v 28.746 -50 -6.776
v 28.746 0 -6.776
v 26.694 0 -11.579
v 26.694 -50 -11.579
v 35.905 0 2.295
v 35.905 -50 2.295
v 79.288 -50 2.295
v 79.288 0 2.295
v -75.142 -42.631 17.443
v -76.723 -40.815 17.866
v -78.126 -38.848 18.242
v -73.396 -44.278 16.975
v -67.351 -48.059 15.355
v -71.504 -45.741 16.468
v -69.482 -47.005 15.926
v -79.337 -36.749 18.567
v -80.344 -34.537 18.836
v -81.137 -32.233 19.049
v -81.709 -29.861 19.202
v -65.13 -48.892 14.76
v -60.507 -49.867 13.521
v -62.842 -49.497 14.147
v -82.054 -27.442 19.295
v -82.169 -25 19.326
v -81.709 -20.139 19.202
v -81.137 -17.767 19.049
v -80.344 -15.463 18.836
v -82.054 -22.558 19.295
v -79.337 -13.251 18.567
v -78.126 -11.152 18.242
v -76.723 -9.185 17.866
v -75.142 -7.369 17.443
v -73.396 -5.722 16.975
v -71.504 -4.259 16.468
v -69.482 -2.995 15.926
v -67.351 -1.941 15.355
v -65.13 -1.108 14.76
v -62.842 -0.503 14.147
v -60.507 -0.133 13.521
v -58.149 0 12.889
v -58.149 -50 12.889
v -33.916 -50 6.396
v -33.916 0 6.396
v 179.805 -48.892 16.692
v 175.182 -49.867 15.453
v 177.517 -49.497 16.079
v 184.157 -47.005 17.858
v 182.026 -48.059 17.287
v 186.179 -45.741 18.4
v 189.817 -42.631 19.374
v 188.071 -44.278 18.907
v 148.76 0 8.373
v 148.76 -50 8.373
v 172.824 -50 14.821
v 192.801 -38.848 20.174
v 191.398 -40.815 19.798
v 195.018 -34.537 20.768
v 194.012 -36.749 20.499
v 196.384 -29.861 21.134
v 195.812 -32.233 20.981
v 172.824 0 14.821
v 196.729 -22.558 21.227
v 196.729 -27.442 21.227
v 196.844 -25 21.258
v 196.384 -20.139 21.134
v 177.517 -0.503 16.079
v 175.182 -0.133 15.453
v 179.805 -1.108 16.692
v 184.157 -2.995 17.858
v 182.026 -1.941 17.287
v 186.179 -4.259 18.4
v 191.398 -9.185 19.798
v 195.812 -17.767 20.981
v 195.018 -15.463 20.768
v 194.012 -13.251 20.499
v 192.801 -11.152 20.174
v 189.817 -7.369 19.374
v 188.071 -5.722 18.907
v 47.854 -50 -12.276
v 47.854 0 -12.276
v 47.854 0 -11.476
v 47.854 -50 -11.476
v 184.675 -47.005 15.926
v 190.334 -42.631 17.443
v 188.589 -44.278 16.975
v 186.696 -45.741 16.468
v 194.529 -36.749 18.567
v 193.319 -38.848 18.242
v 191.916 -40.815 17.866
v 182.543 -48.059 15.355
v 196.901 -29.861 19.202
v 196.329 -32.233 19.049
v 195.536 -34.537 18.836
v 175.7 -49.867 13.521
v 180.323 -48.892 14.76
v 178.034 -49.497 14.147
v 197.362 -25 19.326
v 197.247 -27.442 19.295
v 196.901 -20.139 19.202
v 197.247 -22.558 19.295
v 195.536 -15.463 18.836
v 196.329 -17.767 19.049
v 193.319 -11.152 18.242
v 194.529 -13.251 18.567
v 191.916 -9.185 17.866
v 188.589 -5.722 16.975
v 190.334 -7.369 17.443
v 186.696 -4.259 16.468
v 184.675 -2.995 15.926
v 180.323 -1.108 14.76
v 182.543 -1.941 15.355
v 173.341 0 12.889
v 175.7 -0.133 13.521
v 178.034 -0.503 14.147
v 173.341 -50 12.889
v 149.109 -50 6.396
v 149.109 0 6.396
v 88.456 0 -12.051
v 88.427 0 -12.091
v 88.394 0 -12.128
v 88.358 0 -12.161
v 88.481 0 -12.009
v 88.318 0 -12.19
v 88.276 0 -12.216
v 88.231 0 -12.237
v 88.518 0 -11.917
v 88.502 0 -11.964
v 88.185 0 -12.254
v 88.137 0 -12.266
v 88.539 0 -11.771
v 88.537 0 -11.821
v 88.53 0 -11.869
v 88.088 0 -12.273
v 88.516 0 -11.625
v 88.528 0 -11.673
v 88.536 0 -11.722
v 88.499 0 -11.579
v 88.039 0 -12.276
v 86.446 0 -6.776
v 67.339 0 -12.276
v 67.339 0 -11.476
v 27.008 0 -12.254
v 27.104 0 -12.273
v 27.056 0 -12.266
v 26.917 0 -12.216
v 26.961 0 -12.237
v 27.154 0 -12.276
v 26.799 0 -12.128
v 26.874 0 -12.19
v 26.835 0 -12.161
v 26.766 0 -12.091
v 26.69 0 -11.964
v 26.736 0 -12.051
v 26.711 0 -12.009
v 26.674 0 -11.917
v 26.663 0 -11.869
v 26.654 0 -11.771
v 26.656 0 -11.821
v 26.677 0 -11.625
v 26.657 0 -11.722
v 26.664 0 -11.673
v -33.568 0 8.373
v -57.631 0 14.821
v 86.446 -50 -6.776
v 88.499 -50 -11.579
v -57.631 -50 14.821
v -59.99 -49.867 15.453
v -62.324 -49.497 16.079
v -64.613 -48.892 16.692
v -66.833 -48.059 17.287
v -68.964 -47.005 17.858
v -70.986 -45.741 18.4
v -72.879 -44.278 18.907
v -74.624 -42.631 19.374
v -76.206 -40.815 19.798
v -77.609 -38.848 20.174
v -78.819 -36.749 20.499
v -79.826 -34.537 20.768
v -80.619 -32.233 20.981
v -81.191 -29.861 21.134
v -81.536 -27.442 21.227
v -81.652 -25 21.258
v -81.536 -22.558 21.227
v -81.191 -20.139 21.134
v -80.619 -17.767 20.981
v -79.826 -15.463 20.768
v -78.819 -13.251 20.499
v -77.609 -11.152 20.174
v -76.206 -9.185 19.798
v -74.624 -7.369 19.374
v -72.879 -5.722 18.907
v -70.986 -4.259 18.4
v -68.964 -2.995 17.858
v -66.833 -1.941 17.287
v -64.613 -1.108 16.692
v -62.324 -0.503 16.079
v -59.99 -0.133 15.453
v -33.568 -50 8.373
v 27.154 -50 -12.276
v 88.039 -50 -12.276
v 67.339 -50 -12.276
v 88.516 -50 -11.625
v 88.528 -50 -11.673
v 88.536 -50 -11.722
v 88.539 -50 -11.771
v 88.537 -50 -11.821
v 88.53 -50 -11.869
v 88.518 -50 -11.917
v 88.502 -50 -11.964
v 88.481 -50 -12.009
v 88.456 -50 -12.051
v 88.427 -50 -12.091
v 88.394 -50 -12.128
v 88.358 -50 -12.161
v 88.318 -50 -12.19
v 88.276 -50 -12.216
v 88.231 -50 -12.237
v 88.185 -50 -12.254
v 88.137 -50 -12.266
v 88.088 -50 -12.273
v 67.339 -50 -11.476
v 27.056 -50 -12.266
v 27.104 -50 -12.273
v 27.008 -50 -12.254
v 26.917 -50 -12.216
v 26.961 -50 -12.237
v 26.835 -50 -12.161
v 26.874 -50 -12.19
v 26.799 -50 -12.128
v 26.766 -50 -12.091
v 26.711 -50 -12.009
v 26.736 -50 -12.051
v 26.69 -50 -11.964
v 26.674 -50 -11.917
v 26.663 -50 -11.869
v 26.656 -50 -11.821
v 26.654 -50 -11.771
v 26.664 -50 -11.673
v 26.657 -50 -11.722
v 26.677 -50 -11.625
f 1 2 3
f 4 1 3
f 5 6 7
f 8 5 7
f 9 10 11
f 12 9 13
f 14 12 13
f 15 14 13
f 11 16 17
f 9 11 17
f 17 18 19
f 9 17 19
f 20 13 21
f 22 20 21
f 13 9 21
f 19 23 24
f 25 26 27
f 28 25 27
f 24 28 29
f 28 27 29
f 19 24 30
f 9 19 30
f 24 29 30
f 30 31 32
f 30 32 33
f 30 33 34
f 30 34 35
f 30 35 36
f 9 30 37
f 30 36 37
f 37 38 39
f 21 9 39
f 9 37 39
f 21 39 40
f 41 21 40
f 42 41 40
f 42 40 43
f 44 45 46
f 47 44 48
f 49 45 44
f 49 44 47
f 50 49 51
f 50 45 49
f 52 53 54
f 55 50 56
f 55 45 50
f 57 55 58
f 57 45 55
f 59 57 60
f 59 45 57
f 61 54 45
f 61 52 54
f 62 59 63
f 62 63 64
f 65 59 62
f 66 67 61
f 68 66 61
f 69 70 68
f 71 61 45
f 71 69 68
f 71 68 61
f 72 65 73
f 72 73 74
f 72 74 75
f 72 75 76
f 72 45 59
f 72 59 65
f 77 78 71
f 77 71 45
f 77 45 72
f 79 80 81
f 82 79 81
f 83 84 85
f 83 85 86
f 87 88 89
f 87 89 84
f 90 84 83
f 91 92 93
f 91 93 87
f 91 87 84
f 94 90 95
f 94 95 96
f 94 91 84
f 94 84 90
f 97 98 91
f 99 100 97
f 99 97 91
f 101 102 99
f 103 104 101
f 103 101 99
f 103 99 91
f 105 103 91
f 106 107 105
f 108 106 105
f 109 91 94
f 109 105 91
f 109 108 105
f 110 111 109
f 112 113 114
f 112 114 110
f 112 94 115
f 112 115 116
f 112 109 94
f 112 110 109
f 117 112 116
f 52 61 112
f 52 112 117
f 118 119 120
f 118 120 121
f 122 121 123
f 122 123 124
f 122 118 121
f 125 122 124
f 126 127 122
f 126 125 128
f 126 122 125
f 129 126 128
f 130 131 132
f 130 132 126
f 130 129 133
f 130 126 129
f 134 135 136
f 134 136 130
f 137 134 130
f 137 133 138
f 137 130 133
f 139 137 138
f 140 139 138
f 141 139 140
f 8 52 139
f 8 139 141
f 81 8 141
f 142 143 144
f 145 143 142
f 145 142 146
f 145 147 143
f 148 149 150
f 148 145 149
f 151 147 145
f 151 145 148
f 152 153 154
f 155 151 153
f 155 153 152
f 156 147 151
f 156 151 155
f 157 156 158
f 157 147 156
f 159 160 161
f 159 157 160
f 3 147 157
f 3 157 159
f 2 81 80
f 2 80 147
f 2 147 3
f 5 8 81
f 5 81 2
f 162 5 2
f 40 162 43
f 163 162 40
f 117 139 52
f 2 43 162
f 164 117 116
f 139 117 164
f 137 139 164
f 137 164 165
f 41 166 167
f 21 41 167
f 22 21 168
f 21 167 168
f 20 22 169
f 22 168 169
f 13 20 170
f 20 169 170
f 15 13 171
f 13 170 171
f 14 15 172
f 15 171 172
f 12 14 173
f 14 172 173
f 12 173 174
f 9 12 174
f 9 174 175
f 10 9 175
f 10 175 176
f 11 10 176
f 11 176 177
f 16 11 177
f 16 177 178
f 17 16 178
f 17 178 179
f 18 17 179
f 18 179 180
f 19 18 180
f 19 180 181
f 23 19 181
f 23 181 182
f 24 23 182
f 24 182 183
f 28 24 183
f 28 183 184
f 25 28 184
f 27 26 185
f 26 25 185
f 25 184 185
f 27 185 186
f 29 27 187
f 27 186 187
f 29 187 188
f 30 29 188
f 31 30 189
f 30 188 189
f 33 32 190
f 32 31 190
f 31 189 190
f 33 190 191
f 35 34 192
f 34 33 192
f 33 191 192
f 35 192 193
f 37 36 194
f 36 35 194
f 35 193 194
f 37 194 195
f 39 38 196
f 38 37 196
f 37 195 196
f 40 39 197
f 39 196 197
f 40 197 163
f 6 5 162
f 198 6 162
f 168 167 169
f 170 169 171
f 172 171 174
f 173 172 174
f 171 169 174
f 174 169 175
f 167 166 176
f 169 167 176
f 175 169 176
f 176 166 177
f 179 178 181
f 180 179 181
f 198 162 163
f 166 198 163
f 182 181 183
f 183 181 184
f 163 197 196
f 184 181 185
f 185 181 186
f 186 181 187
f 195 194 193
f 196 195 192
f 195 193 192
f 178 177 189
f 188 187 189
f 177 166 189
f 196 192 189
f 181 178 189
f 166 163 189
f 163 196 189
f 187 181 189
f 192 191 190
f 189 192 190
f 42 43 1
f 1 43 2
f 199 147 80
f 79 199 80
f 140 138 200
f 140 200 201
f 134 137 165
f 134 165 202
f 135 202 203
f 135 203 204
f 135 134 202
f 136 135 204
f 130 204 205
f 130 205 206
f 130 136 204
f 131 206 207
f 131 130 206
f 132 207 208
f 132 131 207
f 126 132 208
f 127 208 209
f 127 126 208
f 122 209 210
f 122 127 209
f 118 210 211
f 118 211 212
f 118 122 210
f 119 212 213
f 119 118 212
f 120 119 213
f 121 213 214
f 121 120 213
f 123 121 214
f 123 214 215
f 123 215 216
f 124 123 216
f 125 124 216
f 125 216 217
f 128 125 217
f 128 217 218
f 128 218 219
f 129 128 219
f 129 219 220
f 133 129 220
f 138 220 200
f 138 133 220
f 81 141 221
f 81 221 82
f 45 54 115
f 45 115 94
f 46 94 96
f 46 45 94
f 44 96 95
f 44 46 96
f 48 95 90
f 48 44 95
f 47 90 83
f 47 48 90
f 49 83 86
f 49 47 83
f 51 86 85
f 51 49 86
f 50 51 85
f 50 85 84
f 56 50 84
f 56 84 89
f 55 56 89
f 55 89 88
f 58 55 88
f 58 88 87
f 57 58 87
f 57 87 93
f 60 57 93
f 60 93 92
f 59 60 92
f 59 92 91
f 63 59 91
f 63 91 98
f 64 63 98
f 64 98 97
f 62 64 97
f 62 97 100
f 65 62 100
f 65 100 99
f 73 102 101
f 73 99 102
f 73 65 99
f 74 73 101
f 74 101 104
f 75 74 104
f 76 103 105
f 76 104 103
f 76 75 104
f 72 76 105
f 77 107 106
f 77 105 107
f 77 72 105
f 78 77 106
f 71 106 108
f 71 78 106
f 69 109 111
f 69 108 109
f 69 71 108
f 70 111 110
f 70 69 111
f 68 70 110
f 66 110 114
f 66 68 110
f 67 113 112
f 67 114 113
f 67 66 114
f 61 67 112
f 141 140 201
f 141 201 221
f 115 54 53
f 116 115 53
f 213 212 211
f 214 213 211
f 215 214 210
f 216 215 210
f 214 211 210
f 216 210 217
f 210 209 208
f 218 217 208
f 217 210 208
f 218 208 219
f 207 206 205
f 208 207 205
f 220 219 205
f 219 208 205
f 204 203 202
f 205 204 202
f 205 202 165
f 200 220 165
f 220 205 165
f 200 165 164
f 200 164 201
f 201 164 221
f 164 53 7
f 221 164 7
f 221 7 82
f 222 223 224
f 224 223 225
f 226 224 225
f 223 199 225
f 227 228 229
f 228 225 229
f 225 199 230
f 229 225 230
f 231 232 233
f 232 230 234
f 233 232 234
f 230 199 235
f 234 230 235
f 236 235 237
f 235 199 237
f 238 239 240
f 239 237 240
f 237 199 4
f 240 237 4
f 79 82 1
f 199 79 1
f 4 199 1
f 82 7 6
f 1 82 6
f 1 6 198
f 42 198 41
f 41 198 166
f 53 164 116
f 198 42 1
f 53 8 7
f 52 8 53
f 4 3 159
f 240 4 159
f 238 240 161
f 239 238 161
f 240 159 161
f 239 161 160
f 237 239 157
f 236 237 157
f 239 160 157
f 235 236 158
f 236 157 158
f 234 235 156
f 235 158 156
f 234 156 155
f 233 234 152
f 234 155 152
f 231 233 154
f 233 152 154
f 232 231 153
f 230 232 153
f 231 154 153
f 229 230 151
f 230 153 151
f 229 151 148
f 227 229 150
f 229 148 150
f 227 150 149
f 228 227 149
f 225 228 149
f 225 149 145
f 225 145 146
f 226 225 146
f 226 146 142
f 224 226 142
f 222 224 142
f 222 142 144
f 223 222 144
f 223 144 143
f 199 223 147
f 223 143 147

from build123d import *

# Parameters (mm, degrees)
F1_DEPTH = 50
F2_W     = 25.7950418632
F2_H     = 50
F3_DEPTH = 9.8


with BuildPart() as f1:
    # F0 (on Front) → F1 (new body)
    with BuildSketch(Plane.XZ):
        with BuildLine():
            Line((28.7462828253, -6.7756745863), (26.6938590785, -11.5792195258))
            ThreePointArc((26.6938590785, -11.5792195258), (26.7363781025, -12.0511491494), (27.153647518, -12.2756745863))
            Line((27.153647518, -12.2756745863), (47.853647518, -12.2756745863))
            Line((47.853647518, -12.2756745863), (47.853647518, -11.4756745863))
            Line((47.853647518, -11.4756745863), (57.5962825562, -11.4756745863))
            Line((57.5962825562, -11.4756745863), (57.5962825562, 2.2953939865))
            Line((57.5962825562, 2.2953939865), (35.9046725562, 2.2953939865))
            Line((35.9046725562, 2.2953939865), (-33.5676551256, 8.3734350875))
            Line((-33.5676551256, 8.3734350875), (-81.6949312565, 21.2690998606))
            ThreePointArc((-81.6949312565, 21.2690998606), (-82.9196765939, 20.5619928104), (-82.2125695437, 19.337247473))
            Line((-82.2125695437, 19.337247473), (-33.9162782292, 6.3962952179))
            Line((-33.9162782292, 6.3962952179), (35.8173506372, 0.2953932255))
            Line((35.8173506372, 0.2953932255), (28.7462828253, -6.7756745863))
        make_face()
        Polygon((-33.9162782292, 6.3962952179), (28.7462828253, -6.7756745863), (35.8173506372, 0.2953932255), align=None)
    extrude(amount=F1_DEPTH)

    # F2 (on face) → F3 (cut)
    with BuildSketch(Plane(origin=(-0.1552477488, 0, -0.5793924863), x_dir=(0.9659258263, 0, -0.2588190451), z_dir=(0.2588190451, 0, 0.9659258263))):
        with BuildLine():
            Line((-84.4160920937, -50), (-59.5035807905, -50))
            ThreePointArc((-59.5035807905, -50), (-84.3714830361, -25), (-59.5035807905, 0))
            Line((-59.5035807905, 0), (-84.4160920937, 0))
            Line((-84.4160920937, 0), (-84.4160920937, -50))
        make_face()
        with Locations((-97.3136130253, -25)):
            Rectangle(F2_W, F2_H)
    extrude(amount=-F3_DEPTH, mode=Mode.SUBTRACT)

    # F4: F1 across face


with BuildPart() as f1_1:
    add(f1.part)
    add(f1.part.mirror(Plane(origin=(57.5962825562, -25, -4.5901402999), x_dir=(0, 1, 0), z_dir=(1, 0, 0))))


solid = f1_1.part
